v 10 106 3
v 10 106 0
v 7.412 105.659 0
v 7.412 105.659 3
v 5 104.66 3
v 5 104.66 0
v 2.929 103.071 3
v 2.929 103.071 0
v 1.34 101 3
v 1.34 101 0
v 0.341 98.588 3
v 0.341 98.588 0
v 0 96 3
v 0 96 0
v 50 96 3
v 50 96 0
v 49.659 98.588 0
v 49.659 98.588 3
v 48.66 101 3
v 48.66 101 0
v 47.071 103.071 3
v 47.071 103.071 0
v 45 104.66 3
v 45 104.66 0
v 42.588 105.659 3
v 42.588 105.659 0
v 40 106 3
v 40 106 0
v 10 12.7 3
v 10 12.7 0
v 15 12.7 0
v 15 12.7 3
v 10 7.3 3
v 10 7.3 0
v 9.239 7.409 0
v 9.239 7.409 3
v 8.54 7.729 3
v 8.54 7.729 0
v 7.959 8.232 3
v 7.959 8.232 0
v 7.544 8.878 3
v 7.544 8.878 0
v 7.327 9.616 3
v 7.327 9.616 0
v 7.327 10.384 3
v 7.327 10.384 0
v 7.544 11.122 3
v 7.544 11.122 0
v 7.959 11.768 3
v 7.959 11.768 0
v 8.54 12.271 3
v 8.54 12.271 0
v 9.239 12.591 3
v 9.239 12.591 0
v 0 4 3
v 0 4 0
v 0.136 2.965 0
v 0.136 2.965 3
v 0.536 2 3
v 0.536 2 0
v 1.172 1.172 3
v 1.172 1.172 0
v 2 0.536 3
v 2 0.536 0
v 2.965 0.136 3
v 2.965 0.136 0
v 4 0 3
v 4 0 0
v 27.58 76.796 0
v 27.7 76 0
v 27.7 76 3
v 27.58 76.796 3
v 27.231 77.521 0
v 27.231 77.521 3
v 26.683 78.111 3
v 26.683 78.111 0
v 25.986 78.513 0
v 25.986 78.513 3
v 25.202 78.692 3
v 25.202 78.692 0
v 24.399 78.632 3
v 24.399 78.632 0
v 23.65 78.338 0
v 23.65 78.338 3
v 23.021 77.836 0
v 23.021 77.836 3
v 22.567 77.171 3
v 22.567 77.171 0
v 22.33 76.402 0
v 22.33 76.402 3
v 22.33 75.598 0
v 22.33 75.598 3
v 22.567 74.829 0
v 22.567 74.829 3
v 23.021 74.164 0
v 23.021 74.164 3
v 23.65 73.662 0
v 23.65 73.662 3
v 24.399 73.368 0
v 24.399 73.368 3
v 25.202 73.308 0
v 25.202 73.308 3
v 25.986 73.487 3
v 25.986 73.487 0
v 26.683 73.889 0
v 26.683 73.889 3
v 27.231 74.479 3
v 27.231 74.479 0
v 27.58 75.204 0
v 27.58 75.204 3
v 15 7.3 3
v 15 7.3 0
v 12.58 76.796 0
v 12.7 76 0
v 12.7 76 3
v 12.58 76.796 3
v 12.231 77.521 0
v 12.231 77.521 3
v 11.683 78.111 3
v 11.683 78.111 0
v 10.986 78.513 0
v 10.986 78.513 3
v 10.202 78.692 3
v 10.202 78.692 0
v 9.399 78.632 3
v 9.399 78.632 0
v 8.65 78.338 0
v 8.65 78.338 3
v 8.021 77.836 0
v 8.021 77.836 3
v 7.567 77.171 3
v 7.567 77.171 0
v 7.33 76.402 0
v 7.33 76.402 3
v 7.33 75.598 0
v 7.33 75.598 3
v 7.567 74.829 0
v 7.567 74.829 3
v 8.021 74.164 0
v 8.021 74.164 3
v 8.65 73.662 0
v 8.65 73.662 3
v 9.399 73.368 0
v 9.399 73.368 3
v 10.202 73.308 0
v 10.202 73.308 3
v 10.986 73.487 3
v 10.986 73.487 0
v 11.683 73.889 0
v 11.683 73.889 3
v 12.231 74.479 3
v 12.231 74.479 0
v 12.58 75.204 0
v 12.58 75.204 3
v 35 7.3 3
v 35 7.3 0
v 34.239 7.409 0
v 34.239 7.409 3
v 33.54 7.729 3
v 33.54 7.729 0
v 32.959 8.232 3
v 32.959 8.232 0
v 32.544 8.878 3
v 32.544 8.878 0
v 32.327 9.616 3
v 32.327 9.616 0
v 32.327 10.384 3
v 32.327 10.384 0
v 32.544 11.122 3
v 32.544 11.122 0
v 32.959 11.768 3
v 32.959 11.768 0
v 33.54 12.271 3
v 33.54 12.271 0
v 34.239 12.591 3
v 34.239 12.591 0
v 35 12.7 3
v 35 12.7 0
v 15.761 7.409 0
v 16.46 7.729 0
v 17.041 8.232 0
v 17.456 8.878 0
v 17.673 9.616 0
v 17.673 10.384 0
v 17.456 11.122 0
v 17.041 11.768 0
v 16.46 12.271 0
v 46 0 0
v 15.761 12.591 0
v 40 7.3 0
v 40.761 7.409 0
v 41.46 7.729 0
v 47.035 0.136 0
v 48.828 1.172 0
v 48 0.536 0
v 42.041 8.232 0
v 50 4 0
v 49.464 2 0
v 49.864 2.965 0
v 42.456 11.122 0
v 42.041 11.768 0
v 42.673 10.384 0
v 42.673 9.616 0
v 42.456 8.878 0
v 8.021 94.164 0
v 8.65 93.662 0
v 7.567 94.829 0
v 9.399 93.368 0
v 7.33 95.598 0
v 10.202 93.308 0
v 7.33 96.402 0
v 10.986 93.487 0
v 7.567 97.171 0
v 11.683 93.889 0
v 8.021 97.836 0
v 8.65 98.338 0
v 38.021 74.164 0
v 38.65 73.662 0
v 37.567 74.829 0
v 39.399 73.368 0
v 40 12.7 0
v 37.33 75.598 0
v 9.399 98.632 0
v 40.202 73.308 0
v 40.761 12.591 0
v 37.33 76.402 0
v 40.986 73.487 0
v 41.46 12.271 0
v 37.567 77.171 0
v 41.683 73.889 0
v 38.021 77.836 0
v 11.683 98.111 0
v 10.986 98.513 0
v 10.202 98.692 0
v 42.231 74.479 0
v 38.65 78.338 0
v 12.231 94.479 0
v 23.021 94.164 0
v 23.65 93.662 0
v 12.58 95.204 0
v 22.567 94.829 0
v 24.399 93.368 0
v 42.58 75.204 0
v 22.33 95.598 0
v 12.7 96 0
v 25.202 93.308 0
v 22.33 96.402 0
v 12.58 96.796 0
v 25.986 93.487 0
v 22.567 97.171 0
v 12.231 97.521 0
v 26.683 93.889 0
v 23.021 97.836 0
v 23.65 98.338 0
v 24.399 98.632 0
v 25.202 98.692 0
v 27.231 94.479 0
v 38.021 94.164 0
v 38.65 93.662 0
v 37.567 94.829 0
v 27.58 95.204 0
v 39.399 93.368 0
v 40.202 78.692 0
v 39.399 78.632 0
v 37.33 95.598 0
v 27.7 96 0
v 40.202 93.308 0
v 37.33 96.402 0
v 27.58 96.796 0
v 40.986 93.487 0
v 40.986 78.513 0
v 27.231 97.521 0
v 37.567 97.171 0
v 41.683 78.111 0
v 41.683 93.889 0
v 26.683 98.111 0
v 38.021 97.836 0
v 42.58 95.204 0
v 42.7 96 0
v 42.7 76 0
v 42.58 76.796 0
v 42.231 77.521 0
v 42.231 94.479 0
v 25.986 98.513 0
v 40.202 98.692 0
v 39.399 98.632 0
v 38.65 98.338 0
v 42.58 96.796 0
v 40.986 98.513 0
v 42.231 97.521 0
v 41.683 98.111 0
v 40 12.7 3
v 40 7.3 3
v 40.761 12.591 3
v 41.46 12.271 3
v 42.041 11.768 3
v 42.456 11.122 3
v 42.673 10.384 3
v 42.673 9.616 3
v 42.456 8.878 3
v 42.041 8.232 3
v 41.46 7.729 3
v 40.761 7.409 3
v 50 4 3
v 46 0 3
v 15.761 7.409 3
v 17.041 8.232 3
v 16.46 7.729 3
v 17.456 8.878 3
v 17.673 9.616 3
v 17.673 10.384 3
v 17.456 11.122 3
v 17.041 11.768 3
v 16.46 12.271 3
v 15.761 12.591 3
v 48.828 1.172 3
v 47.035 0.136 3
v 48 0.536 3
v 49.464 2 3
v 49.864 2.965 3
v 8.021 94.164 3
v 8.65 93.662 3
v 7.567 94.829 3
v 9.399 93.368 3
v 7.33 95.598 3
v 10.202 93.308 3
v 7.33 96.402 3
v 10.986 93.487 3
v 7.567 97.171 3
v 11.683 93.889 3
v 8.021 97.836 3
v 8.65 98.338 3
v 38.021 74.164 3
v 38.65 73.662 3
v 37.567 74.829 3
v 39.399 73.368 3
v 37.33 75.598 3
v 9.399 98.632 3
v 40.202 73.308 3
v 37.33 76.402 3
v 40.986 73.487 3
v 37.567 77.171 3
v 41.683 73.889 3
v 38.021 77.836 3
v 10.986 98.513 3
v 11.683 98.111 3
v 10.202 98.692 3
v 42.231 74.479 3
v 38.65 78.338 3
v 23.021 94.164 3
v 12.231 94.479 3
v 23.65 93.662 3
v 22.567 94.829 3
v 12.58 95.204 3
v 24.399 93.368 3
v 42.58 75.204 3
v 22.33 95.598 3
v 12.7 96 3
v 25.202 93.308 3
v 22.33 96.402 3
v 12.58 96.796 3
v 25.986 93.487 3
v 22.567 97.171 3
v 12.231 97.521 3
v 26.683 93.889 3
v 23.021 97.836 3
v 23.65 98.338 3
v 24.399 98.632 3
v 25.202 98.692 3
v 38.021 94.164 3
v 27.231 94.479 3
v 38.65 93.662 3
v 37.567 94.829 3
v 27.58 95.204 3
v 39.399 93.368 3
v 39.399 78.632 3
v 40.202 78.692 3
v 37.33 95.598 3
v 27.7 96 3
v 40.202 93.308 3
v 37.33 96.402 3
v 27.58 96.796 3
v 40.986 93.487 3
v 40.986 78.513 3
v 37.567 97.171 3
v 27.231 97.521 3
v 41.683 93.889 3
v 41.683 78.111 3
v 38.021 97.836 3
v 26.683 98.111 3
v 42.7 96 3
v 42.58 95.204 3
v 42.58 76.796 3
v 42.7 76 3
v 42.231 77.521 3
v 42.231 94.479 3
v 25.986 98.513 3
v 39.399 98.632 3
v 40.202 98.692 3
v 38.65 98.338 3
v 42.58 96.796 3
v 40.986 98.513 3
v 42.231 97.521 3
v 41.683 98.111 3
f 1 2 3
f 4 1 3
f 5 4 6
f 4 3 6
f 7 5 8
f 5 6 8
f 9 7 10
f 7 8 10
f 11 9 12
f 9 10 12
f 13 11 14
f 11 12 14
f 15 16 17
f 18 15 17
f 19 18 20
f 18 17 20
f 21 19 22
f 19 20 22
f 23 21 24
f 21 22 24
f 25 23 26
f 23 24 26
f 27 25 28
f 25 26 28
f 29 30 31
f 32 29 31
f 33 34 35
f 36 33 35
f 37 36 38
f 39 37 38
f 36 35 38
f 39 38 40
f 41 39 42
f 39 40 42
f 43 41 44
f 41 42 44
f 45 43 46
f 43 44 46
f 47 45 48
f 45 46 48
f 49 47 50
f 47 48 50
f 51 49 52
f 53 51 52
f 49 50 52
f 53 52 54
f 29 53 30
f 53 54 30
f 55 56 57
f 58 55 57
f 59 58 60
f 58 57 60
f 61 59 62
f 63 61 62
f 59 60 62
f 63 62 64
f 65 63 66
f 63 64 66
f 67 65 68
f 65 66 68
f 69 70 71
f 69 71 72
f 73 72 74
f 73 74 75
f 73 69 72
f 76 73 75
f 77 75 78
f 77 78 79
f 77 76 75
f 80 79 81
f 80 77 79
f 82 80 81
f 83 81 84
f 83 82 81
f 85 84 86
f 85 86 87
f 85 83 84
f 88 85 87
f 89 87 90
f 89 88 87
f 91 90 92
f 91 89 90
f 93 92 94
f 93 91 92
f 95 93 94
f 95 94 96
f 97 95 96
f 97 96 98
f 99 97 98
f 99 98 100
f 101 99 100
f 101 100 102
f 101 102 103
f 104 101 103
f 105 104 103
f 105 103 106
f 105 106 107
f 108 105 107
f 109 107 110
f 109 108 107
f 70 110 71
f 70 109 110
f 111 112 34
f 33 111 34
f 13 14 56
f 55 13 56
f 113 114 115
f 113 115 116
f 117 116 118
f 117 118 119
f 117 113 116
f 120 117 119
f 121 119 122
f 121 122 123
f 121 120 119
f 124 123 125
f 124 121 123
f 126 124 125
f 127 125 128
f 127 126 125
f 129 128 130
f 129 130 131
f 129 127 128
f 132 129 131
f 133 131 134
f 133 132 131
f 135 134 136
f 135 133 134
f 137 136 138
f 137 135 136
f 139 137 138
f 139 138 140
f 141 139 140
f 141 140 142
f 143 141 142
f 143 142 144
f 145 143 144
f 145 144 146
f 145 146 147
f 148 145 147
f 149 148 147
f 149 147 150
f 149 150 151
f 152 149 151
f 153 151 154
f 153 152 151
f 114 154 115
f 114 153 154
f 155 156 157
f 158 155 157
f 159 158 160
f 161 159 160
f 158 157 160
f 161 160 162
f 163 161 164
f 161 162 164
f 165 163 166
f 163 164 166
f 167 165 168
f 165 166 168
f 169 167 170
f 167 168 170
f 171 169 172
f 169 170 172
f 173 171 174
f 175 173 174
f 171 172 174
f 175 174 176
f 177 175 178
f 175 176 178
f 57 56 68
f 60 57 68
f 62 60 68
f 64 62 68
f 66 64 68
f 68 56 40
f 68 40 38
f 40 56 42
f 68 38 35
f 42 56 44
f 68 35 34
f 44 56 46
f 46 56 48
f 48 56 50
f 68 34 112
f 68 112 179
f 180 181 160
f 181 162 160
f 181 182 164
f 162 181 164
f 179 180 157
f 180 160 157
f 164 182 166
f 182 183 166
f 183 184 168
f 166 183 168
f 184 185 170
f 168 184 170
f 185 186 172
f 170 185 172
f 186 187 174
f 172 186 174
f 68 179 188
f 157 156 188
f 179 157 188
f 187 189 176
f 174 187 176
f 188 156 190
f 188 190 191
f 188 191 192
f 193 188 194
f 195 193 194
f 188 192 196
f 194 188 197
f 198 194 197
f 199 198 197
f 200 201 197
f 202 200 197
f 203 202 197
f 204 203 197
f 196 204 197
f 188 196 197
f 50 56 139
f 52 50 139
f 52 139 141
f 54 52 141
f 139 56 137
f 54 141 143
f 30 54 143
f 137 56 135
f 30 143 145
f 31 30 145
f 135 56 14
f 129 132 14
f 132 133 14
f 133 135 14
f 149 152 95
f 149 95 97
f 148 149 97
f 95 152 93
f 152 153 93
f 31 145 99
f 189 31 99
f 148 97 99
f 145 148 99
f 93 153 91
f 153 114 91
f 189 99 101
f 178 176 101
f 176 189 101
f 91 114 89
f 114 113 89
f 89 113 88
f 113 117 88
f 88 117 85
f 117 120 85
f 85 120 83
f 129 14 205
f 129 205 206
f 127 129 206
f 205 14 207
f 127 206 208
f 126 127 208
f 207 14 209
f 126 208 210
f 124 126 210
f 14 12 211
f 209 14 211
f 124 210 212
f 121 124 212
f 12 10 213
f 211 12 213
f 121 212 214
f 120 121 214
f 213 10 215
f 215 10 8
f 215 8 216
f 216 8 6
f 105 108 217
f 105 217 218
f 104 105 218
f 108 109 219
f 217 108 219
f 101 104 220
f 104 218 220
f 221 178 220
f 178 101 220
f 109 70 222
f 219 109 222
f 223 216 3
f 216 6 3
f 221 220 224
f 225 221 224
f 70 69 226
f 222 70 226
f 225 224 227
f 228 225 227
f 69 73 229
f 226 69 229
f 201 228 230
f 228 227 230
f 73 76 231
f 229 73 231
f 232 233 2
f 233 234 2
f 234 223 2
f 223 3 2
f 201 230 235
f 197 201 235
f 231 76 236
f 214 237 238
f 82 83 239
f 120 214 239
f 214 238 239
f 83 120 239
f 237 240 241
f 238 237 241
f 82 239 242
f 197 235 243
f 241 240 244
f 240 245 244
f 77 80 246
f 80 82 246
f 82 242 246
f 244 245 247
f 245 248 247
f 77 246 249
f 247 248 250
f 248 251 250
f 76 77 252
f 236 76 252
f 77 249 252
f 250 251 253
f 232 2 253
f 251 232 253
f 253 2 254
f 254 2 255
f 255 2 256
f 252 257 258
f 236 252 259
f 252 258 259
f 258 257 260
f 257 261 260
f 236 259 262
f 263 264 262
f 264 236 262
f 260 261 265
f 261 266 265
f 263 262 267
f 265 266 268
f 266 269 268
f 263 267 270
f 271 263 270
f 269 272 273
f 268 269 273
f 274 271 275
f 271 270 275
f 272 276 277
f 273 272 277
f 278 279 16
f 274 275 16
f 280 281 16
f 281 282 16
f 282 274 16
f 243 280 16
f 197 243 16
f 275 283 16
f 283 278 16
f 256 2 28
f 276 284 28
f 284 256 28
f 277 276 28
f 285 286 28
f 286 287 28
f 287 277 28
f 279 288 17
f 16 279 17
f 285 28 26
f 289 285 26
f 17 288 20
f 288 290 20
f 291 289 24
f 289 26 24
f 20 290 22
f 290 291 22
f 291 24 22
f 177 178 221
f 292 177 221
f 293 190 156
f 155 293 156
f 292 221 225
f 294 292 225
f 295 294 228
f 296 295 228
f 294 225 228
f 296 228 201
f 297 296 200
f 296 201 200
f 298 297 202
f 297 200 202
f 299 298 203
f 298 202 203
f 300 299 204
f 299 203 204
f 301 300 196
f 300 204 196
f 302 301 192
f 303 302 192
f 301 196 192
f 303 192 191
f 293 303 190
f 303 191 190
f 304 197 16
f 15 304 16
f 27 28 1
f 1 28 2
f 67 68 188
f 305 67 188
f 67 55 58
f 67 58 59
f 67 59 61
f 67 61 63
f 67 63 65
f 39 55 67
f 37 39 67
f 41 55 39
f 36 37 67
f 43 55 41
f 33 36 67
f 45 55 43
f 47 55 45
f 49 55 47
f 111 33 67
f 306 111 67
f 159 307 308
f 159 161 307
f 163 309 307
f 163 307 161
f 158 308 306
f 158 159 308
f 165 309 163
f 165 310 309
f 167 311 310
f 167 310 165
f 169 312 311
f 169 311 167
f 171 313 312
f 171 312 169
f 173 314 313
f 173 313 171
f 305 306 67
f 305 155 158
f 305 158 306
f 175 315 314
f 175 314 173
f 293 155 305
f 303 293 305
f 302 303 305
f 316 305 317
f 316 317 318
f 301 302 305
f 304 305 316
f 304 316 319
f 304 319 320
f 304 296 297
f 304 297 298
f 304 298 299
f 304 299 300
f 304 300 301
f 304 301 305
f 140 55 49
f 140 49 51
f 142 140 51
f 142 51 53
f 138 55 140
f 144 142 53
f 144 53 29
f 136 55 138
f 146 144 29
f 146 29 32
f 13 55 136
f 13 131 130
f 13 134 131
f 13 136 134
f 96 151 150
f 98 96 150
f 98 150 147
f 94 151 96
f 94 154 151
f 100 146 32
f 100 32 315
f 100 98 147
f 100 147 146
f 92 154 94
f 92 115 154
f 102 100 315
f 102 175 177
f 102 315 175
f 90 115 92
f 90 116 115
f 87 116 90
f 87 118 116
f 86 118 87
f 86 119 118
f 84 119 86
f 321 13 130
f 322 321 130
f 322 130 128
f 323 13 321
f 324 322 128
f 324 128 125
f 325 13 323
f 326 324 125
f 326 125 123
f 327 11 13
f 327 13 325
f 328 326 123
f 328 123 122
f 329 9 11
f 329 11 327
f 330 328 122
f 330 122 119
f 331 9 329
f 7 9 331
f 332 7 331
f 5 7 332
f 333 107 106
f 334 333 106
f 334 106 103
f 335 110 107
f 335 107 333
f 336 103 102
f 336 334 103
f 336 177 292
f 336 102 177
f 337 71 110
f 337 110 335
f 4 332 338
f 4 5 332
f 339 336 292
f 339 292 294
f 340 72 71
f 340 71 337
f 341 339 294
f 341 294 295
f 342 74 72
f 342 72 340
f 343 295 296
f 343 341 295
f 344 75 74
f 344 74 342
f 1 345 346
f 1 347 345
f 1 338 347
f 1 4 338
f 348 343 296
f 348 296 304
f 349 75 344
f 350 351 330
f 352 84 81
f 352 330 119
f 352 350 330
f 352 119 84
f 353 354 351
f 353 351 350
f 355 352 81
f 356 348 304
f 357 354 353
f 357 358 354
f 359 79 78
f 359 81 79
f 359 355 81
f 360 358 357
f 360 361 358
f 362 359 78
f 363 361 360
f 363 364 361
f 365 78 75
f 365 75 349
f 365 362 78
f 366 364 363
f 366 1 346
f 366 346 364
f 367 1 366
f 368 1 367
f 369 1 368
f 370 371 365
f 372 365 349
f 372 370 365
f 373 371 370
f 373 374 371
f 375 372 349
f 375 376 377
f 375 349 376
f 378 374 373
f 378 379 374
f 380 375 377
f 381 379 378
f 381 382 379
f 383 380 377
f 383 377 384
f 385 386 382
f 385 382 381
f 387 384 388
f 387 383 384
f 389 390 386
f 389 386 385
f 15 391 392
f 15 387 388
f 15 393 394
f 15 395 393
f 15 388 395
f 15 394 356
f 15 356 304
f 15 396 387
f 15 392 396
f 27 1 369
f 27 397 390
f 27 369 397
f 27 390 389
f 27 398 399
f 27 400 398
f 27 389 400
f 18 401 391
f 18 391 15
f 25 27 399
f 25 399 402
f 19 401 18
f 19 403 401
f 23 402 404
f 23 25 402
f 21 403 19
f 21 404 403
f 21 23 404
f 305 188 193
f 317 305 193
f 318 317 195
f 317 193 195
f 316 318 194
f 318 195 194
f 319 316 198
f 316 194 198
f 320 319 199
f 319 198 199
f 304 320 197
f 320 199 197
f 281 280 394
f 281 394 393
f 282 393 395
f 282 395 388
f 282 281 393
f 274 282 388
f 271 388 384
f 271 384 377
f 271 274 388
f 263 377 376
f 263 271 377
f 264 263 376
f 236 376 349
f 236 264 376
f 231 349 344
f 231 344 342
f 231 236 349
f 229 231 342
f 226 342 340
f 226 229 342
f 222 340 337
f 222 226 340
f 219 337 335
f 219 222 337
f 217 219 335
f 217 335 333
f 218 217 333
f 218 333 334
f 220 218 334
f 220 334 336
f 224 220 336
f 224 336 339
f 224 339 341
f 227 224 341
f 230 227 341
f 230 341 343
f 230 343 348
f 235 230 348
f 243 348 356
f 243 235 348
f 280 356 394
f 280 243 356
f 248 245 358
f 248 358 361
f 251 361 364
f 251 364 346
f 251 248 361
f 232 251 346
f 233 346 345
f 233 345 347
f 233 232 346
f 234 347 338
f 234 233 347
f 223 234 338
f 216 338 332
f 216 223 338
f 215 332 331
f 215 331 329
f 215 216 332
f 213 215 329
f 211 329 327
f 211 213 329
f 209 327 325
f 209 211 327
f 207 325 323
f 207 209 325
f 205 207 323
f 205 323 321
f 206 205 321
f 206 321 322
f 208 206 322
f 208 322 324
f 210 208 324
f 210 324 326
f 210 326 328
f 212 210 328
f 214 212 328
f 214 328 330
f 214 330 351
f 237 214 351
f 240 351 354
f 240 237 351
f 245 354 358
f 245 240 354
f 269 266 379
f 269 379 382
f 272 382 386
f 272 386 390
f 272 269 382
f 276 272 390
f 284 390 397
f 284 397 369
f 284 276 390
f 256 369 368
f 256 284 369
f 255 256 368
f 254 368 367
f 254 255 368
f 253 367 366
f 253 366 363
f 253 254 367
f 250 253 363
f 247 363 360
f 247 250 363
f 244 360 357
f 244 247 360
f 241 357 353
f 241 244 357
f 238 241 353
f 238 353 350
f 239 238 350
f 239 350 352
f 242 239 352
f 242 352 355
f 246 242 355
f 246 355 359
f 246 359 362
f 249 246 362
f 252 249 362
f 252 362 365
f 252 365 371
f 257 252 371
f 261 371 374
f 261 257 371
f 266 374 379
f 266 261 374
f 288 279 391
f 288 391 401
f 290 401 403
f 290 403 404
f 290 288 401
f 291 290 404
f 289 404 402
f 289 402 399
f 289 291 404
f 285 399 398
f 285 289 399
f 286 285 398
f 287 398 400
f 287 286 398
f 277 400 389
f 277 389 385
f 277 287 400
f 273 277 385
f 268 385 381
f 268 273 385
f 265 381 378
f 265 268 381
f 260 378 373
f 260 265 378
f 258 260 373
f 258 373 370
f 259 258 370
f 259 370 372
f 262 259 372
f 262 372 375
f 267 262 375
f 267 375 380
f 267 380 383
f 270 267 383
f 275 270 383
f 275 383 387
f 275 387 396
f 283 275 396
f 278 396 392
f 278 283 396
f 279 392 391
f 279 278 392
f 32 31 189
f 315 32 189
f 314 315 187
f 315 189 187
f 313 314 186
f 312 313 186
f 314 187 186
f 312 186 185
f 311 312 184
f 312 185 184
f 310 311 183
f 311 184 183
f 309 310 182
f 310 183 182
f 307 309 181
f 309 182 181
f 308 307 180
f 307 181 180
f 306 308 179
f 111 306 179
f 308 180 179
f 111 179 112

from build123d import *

# Parameters (mm, degrees)
MODEL_R                         = 2.7
AUFSATZ_LINEAR_AUSTRAGEN1_DEPTH = 3


with BuildPart() as part:
    # Model → Aufsatz-Linear austragen1 (new body)
    with BuildSketch(Plane.XY):
        with BuildLine():
            Line((40, 106), (10, 106))
            ThreePointArc((10, 106), (2.928932188, 103.071067812), (0, 96))
            Line((0, 96), (0, 4))
            ThreePointArc((0, 4), (1.171572875, 1.171572875), (4, 0))
            Line((4, 0), (46, 0))
            ThreePointArc((46, 0), (48.828427125, 1.171572875), (50, 4))
            Line((50, 4), (50, 96))
            ThreePointArc((50, 96), (47.071067812, 103.071067812), (40, 106))
        make_face()
        with Locations((25, 76)):
            Circle(MODEL_R, mode=Mode.SUBTRACT)
        with Locations((25, 96)):
            Circle(MODEL_R, mode=Mode.SUBTRACT)
        with Locations((40, 76)):
            Circle(MODEL_R, mode=Mode.SUBTRACT)
        with Locations((40, 96)):
            Circle(MODEL_R, mode=Mode.SUBTRACT)
        with Locations((10, 76)):
            Circle(MODEL_R, mode=Mode.SUBTRACT)
        with Locations((10, 96)):
            Circle(MODEL_R, mode=Mode.SUBTRACT)
        with BuildLine():
            Line((15, 7.3), (10, 7.3))
            ThreePointArc((10, 7.3), (7.3, 10), (10, 12.7))
            Line((10, 12.7), (15, 12.7))
            ThreePointArc((15, 12.7), (17.7, 10), (15, 7.3))
        make_face(mode=Mode.SUBTRACT)
        with BuildLine():
            Line((40, 7.3), (35, 7.3))
            ThreePointArc((35, 7.3), (32.3, 10), (35, 12.7))
            Line((35, 12.7), (40, 12.7))
            ThreePointArc((40, 12.7), (42.7, 10), (40, 7.3))
        make_face(mode=Mode.SUBTRACT)
    extrude(amount=AUFSATZ_LINEAR_AUSTRAGEN1_DEPTH)


solid = part.part
